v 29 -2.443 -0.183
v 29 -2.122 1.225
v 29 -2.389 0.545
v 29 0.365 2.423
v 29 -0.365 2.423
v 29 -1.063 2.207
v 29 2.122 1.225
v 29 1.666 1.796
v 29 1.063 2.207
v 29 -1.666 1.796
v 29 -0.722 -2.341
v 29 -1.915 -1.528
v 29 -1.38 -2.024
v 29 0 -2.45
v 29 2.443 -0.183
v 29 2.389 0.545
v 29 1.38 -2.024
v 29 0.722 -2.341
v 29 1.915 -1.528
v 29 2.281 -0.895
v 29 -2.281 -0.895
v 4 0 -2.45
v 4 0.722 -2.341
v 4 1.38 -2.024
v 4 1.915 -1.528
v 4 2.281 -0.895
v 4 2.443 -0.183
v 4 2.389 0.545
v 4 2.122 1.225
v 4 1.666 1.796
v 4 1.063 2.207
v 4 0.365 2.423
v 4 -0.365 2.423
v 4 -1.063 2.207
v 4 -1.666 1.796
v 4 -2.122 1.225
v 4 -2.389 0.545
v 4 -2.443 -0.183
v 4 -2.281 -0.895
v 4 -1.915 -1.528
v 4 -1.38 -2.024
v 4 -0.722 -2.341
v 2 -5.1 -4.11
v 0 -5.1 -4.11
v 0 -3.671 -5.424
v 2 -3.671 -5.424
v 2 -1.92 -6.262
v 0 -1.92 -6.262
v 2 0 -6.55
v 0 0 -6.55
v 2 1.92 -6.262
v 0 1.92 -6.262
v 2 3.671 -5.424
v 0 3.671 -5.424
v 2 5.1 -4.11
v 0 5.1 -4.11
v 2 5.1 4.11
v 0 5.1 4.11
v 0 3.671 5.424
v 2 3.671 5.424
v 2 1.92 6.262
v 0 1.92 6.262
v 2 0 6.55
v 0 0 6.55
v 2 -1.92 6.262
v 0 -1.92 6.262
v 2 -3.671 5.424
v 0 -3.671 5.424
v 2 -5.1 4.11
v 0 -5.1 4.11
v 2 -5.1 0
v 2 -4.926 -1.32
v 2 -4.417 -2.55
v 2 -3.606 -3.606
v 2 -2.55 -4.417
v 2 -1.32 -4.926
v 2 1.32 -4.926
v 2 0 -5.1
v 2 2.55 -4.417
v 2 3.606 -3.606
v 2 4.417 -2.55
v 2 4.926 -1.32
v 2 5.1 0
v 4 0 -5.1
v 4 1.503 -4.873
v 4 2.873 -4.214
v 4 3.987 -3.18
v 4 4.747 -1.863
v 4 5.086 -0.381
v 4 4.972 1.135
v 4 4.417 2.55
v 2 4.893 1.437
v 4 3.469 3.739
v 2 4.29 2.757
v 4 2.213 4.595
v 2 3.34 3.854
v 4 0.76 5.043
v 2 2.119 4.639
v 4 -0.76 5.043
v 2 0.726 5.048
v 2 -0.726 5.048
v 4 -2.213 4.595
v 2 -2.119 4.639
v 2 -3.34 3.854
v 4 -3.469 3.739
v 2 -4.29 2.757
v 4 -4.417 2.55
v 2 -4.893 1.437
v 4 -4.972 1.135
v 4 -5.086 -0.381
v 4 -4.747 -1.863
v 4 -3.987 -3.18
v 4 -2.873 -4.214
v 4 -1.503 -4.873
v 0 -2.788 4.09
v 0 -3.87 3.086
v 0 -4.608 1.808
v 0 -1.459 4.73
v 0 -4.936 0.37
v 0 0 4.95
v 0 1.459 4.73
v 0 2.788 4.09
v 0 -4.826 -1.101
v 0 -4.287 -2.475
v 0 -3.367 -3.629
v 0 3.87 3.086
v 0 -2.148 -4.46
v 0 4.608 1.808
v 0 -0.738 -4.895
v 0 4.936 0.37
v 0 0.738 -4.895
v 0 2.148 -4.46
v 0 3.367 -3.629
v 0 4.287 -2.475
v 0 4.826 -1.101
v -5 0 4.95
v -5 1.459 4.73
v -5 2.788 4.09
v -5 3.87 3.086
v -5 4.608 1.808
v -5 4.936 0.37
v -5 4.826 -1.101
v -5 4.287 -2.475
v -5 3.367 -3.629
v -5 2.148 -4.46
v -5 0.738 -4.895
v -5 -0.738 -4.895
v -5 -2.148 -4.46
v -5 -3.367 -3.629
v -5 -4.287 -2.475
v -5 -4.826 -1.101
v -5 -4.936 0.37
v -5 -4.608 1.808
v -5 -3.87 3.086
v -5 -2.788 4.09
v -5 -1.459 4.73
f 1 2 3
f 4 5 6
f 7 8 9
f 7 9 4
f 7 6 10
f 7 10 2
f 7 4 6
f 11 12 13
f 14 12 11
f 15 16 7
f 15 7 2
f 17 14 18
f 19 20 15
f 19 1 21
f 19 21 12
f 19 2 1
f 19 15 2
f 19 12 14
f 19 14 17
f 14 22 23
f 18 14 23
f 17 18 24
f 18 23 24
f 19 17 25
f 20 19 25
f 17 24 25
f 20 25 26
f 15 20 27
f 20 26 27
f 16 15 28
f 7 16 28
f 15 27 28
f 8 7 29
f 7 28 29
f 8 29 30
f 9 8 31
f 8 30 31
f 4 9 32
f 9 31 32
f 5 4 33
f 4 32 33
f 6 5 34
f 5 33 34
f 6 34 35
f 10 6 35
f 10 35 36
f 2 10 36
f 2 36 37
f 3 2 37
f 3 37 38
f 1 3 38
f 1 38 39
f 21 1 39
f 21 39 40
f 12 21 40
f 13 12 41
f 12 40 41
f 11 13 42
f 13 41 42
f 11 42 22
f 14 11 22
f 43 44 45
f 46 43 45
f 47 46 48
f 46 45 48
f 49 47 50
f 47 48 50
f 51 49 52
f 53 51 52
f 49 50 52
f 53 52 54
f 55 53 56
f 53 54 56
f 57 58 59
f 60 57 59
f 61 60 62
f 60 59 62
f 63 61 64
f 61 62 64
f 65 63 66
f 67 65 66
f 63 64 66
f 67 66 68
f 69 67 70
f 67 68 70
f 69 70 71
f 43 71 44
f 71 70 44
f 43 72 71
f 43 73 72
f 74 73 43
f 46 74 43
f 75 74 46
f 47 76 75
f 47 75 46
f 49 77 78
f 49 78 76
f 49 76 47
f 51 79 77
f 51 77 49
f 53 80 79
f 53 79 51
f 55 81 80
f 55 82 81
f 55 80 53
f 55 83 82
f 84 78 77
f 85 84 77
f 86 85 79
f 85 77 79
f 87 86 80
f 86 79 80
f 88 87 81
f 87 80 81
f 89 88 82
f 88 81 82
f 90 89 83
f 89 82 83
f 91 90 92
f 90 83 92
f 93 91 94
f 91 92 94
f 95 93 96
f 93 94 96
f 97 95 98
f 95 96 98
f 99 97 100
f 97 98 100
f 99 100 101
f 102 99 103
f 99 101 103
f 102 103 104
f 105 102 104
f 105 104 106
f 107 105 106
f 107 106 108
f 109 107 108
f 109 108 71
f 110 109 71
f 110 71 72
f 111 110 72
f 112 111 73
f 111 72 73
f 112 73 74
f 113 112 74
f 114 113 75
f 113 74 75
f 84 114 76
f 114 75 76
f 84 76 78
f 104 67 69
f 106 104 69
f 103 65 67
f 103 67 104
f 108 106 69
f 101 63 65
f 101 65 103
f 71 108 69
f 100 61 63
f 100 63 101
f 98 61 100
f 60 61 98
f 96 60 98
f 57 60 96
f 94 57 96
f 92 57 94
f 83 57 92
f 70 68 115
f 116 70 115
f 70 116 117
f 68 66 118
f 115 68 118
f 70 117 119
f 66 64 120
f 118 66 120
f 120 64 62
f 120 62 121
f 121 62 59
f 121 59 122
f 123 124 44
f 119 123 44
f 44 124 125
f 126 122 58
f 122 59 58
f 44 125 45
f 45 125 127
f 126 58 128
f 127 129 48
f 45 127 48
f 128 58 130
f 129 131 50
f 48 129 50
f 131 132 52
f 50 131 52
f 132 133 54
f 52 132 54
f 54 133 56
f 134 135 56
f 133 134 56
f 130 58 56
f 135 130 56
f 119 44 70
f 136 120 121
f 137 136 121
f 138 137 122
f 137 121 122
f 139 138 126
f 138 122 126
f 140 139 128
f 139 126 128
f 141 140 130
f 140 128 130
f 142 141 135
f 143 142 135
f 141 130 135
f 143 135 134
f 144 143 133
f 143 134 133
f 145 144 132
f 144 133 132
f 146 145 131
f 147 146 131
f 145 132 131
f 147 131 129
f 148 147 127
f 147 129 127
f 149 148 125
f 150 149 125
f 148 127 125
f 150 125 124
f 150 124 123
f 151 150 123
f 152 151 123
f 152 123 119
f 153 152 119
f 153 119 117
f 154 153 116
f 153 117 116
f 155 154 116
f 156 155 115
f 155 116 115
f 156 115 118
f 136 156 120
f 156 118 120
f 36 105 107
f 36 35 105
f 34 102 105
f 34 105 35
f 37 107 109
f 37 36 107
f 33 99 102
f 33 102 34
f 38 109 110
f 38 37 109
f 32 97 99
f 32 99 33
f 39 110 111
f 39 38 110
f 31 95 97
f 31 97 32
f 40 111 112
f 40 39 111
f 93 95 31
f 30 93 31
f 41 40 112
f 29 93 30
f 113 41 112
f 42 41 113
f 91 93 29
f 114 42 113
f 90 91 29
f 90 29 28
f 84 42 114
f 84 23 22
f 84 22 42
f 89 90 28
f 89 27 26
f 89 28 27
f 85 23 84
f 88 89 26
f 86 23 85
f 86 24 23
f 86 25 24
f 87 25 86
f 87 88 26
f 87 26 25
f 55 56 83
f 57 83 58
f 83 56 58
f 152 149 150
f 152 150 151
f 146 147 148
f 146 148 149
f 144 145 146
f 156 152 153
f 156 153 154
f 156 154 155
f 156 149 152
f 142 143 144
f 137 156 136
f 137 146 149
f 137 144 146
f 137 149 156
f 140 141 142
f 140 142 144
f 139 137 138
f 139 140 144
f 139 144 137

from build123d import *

# Parameters (mm, degrees)
EXTRUDE_1_DEPTH = 2
SKETCH_3_R      = 5.1
EXTRUDE_2_DEPTH = 2
SKETCH_4_R      = 2.45
EXTRUDE_3_DEPTH = 25
SKETCH_5_R      = 4.95
EXTRUDE_4_DEPTH = 5


with BuildPart() as part:
    # 草图2 → 凸台-拉伸1 (new body)
    with BuildSketch(Plane(origin=(0, 0, 0), x_dir=(0, 0, -1), z_dir=(1, 0, 0))):
        with BuildLine():
            Line((4.110048662, 5.1), (-4.110048662, 5.1))
            ThreePointArc((-4.110048662, 5.1), (-6.55, 0), (-4.110048662, -5.1))
            Line((-4.110048662, -5.1), (4.110048662, -5.1))
            ThreePointArc((4.110048662, -5.1), (6.55, 0), (4.110048662, 5.1))
        make_face()
    extrude(amount=EXTRUDE_1_DEPTH)

    # 草图3 → 凸台-拉伸2 (add)
    with BuildSketch(Plane(origin=(2, 0, 0), x_dir=(0, 0, -1), z_dir=(1, 0, 0))):
        Circle(SKETCH_3_R)
    extrude(amount=EXTRUDE_2_DEPTH)

    # 草图4 → 凸台-拉伸3 (add)
    with BuildSketch(Plane(origin=(4, 0, 0), x_dir=(0, 0, -1), z_dir=(1, 0, 0))):
        Circle(SKETCH_4_R)
    extrude(amount=EXTRUDE_3_DEPTH)

    # 草图5 → 凸台-拉伸4 (add)
    with BuildSketch(Plane.ZY):
        Circle(SKETCH_5_R)
    extrude(amount=EXTRUDE_4_DEPTH)


solid = part.part
